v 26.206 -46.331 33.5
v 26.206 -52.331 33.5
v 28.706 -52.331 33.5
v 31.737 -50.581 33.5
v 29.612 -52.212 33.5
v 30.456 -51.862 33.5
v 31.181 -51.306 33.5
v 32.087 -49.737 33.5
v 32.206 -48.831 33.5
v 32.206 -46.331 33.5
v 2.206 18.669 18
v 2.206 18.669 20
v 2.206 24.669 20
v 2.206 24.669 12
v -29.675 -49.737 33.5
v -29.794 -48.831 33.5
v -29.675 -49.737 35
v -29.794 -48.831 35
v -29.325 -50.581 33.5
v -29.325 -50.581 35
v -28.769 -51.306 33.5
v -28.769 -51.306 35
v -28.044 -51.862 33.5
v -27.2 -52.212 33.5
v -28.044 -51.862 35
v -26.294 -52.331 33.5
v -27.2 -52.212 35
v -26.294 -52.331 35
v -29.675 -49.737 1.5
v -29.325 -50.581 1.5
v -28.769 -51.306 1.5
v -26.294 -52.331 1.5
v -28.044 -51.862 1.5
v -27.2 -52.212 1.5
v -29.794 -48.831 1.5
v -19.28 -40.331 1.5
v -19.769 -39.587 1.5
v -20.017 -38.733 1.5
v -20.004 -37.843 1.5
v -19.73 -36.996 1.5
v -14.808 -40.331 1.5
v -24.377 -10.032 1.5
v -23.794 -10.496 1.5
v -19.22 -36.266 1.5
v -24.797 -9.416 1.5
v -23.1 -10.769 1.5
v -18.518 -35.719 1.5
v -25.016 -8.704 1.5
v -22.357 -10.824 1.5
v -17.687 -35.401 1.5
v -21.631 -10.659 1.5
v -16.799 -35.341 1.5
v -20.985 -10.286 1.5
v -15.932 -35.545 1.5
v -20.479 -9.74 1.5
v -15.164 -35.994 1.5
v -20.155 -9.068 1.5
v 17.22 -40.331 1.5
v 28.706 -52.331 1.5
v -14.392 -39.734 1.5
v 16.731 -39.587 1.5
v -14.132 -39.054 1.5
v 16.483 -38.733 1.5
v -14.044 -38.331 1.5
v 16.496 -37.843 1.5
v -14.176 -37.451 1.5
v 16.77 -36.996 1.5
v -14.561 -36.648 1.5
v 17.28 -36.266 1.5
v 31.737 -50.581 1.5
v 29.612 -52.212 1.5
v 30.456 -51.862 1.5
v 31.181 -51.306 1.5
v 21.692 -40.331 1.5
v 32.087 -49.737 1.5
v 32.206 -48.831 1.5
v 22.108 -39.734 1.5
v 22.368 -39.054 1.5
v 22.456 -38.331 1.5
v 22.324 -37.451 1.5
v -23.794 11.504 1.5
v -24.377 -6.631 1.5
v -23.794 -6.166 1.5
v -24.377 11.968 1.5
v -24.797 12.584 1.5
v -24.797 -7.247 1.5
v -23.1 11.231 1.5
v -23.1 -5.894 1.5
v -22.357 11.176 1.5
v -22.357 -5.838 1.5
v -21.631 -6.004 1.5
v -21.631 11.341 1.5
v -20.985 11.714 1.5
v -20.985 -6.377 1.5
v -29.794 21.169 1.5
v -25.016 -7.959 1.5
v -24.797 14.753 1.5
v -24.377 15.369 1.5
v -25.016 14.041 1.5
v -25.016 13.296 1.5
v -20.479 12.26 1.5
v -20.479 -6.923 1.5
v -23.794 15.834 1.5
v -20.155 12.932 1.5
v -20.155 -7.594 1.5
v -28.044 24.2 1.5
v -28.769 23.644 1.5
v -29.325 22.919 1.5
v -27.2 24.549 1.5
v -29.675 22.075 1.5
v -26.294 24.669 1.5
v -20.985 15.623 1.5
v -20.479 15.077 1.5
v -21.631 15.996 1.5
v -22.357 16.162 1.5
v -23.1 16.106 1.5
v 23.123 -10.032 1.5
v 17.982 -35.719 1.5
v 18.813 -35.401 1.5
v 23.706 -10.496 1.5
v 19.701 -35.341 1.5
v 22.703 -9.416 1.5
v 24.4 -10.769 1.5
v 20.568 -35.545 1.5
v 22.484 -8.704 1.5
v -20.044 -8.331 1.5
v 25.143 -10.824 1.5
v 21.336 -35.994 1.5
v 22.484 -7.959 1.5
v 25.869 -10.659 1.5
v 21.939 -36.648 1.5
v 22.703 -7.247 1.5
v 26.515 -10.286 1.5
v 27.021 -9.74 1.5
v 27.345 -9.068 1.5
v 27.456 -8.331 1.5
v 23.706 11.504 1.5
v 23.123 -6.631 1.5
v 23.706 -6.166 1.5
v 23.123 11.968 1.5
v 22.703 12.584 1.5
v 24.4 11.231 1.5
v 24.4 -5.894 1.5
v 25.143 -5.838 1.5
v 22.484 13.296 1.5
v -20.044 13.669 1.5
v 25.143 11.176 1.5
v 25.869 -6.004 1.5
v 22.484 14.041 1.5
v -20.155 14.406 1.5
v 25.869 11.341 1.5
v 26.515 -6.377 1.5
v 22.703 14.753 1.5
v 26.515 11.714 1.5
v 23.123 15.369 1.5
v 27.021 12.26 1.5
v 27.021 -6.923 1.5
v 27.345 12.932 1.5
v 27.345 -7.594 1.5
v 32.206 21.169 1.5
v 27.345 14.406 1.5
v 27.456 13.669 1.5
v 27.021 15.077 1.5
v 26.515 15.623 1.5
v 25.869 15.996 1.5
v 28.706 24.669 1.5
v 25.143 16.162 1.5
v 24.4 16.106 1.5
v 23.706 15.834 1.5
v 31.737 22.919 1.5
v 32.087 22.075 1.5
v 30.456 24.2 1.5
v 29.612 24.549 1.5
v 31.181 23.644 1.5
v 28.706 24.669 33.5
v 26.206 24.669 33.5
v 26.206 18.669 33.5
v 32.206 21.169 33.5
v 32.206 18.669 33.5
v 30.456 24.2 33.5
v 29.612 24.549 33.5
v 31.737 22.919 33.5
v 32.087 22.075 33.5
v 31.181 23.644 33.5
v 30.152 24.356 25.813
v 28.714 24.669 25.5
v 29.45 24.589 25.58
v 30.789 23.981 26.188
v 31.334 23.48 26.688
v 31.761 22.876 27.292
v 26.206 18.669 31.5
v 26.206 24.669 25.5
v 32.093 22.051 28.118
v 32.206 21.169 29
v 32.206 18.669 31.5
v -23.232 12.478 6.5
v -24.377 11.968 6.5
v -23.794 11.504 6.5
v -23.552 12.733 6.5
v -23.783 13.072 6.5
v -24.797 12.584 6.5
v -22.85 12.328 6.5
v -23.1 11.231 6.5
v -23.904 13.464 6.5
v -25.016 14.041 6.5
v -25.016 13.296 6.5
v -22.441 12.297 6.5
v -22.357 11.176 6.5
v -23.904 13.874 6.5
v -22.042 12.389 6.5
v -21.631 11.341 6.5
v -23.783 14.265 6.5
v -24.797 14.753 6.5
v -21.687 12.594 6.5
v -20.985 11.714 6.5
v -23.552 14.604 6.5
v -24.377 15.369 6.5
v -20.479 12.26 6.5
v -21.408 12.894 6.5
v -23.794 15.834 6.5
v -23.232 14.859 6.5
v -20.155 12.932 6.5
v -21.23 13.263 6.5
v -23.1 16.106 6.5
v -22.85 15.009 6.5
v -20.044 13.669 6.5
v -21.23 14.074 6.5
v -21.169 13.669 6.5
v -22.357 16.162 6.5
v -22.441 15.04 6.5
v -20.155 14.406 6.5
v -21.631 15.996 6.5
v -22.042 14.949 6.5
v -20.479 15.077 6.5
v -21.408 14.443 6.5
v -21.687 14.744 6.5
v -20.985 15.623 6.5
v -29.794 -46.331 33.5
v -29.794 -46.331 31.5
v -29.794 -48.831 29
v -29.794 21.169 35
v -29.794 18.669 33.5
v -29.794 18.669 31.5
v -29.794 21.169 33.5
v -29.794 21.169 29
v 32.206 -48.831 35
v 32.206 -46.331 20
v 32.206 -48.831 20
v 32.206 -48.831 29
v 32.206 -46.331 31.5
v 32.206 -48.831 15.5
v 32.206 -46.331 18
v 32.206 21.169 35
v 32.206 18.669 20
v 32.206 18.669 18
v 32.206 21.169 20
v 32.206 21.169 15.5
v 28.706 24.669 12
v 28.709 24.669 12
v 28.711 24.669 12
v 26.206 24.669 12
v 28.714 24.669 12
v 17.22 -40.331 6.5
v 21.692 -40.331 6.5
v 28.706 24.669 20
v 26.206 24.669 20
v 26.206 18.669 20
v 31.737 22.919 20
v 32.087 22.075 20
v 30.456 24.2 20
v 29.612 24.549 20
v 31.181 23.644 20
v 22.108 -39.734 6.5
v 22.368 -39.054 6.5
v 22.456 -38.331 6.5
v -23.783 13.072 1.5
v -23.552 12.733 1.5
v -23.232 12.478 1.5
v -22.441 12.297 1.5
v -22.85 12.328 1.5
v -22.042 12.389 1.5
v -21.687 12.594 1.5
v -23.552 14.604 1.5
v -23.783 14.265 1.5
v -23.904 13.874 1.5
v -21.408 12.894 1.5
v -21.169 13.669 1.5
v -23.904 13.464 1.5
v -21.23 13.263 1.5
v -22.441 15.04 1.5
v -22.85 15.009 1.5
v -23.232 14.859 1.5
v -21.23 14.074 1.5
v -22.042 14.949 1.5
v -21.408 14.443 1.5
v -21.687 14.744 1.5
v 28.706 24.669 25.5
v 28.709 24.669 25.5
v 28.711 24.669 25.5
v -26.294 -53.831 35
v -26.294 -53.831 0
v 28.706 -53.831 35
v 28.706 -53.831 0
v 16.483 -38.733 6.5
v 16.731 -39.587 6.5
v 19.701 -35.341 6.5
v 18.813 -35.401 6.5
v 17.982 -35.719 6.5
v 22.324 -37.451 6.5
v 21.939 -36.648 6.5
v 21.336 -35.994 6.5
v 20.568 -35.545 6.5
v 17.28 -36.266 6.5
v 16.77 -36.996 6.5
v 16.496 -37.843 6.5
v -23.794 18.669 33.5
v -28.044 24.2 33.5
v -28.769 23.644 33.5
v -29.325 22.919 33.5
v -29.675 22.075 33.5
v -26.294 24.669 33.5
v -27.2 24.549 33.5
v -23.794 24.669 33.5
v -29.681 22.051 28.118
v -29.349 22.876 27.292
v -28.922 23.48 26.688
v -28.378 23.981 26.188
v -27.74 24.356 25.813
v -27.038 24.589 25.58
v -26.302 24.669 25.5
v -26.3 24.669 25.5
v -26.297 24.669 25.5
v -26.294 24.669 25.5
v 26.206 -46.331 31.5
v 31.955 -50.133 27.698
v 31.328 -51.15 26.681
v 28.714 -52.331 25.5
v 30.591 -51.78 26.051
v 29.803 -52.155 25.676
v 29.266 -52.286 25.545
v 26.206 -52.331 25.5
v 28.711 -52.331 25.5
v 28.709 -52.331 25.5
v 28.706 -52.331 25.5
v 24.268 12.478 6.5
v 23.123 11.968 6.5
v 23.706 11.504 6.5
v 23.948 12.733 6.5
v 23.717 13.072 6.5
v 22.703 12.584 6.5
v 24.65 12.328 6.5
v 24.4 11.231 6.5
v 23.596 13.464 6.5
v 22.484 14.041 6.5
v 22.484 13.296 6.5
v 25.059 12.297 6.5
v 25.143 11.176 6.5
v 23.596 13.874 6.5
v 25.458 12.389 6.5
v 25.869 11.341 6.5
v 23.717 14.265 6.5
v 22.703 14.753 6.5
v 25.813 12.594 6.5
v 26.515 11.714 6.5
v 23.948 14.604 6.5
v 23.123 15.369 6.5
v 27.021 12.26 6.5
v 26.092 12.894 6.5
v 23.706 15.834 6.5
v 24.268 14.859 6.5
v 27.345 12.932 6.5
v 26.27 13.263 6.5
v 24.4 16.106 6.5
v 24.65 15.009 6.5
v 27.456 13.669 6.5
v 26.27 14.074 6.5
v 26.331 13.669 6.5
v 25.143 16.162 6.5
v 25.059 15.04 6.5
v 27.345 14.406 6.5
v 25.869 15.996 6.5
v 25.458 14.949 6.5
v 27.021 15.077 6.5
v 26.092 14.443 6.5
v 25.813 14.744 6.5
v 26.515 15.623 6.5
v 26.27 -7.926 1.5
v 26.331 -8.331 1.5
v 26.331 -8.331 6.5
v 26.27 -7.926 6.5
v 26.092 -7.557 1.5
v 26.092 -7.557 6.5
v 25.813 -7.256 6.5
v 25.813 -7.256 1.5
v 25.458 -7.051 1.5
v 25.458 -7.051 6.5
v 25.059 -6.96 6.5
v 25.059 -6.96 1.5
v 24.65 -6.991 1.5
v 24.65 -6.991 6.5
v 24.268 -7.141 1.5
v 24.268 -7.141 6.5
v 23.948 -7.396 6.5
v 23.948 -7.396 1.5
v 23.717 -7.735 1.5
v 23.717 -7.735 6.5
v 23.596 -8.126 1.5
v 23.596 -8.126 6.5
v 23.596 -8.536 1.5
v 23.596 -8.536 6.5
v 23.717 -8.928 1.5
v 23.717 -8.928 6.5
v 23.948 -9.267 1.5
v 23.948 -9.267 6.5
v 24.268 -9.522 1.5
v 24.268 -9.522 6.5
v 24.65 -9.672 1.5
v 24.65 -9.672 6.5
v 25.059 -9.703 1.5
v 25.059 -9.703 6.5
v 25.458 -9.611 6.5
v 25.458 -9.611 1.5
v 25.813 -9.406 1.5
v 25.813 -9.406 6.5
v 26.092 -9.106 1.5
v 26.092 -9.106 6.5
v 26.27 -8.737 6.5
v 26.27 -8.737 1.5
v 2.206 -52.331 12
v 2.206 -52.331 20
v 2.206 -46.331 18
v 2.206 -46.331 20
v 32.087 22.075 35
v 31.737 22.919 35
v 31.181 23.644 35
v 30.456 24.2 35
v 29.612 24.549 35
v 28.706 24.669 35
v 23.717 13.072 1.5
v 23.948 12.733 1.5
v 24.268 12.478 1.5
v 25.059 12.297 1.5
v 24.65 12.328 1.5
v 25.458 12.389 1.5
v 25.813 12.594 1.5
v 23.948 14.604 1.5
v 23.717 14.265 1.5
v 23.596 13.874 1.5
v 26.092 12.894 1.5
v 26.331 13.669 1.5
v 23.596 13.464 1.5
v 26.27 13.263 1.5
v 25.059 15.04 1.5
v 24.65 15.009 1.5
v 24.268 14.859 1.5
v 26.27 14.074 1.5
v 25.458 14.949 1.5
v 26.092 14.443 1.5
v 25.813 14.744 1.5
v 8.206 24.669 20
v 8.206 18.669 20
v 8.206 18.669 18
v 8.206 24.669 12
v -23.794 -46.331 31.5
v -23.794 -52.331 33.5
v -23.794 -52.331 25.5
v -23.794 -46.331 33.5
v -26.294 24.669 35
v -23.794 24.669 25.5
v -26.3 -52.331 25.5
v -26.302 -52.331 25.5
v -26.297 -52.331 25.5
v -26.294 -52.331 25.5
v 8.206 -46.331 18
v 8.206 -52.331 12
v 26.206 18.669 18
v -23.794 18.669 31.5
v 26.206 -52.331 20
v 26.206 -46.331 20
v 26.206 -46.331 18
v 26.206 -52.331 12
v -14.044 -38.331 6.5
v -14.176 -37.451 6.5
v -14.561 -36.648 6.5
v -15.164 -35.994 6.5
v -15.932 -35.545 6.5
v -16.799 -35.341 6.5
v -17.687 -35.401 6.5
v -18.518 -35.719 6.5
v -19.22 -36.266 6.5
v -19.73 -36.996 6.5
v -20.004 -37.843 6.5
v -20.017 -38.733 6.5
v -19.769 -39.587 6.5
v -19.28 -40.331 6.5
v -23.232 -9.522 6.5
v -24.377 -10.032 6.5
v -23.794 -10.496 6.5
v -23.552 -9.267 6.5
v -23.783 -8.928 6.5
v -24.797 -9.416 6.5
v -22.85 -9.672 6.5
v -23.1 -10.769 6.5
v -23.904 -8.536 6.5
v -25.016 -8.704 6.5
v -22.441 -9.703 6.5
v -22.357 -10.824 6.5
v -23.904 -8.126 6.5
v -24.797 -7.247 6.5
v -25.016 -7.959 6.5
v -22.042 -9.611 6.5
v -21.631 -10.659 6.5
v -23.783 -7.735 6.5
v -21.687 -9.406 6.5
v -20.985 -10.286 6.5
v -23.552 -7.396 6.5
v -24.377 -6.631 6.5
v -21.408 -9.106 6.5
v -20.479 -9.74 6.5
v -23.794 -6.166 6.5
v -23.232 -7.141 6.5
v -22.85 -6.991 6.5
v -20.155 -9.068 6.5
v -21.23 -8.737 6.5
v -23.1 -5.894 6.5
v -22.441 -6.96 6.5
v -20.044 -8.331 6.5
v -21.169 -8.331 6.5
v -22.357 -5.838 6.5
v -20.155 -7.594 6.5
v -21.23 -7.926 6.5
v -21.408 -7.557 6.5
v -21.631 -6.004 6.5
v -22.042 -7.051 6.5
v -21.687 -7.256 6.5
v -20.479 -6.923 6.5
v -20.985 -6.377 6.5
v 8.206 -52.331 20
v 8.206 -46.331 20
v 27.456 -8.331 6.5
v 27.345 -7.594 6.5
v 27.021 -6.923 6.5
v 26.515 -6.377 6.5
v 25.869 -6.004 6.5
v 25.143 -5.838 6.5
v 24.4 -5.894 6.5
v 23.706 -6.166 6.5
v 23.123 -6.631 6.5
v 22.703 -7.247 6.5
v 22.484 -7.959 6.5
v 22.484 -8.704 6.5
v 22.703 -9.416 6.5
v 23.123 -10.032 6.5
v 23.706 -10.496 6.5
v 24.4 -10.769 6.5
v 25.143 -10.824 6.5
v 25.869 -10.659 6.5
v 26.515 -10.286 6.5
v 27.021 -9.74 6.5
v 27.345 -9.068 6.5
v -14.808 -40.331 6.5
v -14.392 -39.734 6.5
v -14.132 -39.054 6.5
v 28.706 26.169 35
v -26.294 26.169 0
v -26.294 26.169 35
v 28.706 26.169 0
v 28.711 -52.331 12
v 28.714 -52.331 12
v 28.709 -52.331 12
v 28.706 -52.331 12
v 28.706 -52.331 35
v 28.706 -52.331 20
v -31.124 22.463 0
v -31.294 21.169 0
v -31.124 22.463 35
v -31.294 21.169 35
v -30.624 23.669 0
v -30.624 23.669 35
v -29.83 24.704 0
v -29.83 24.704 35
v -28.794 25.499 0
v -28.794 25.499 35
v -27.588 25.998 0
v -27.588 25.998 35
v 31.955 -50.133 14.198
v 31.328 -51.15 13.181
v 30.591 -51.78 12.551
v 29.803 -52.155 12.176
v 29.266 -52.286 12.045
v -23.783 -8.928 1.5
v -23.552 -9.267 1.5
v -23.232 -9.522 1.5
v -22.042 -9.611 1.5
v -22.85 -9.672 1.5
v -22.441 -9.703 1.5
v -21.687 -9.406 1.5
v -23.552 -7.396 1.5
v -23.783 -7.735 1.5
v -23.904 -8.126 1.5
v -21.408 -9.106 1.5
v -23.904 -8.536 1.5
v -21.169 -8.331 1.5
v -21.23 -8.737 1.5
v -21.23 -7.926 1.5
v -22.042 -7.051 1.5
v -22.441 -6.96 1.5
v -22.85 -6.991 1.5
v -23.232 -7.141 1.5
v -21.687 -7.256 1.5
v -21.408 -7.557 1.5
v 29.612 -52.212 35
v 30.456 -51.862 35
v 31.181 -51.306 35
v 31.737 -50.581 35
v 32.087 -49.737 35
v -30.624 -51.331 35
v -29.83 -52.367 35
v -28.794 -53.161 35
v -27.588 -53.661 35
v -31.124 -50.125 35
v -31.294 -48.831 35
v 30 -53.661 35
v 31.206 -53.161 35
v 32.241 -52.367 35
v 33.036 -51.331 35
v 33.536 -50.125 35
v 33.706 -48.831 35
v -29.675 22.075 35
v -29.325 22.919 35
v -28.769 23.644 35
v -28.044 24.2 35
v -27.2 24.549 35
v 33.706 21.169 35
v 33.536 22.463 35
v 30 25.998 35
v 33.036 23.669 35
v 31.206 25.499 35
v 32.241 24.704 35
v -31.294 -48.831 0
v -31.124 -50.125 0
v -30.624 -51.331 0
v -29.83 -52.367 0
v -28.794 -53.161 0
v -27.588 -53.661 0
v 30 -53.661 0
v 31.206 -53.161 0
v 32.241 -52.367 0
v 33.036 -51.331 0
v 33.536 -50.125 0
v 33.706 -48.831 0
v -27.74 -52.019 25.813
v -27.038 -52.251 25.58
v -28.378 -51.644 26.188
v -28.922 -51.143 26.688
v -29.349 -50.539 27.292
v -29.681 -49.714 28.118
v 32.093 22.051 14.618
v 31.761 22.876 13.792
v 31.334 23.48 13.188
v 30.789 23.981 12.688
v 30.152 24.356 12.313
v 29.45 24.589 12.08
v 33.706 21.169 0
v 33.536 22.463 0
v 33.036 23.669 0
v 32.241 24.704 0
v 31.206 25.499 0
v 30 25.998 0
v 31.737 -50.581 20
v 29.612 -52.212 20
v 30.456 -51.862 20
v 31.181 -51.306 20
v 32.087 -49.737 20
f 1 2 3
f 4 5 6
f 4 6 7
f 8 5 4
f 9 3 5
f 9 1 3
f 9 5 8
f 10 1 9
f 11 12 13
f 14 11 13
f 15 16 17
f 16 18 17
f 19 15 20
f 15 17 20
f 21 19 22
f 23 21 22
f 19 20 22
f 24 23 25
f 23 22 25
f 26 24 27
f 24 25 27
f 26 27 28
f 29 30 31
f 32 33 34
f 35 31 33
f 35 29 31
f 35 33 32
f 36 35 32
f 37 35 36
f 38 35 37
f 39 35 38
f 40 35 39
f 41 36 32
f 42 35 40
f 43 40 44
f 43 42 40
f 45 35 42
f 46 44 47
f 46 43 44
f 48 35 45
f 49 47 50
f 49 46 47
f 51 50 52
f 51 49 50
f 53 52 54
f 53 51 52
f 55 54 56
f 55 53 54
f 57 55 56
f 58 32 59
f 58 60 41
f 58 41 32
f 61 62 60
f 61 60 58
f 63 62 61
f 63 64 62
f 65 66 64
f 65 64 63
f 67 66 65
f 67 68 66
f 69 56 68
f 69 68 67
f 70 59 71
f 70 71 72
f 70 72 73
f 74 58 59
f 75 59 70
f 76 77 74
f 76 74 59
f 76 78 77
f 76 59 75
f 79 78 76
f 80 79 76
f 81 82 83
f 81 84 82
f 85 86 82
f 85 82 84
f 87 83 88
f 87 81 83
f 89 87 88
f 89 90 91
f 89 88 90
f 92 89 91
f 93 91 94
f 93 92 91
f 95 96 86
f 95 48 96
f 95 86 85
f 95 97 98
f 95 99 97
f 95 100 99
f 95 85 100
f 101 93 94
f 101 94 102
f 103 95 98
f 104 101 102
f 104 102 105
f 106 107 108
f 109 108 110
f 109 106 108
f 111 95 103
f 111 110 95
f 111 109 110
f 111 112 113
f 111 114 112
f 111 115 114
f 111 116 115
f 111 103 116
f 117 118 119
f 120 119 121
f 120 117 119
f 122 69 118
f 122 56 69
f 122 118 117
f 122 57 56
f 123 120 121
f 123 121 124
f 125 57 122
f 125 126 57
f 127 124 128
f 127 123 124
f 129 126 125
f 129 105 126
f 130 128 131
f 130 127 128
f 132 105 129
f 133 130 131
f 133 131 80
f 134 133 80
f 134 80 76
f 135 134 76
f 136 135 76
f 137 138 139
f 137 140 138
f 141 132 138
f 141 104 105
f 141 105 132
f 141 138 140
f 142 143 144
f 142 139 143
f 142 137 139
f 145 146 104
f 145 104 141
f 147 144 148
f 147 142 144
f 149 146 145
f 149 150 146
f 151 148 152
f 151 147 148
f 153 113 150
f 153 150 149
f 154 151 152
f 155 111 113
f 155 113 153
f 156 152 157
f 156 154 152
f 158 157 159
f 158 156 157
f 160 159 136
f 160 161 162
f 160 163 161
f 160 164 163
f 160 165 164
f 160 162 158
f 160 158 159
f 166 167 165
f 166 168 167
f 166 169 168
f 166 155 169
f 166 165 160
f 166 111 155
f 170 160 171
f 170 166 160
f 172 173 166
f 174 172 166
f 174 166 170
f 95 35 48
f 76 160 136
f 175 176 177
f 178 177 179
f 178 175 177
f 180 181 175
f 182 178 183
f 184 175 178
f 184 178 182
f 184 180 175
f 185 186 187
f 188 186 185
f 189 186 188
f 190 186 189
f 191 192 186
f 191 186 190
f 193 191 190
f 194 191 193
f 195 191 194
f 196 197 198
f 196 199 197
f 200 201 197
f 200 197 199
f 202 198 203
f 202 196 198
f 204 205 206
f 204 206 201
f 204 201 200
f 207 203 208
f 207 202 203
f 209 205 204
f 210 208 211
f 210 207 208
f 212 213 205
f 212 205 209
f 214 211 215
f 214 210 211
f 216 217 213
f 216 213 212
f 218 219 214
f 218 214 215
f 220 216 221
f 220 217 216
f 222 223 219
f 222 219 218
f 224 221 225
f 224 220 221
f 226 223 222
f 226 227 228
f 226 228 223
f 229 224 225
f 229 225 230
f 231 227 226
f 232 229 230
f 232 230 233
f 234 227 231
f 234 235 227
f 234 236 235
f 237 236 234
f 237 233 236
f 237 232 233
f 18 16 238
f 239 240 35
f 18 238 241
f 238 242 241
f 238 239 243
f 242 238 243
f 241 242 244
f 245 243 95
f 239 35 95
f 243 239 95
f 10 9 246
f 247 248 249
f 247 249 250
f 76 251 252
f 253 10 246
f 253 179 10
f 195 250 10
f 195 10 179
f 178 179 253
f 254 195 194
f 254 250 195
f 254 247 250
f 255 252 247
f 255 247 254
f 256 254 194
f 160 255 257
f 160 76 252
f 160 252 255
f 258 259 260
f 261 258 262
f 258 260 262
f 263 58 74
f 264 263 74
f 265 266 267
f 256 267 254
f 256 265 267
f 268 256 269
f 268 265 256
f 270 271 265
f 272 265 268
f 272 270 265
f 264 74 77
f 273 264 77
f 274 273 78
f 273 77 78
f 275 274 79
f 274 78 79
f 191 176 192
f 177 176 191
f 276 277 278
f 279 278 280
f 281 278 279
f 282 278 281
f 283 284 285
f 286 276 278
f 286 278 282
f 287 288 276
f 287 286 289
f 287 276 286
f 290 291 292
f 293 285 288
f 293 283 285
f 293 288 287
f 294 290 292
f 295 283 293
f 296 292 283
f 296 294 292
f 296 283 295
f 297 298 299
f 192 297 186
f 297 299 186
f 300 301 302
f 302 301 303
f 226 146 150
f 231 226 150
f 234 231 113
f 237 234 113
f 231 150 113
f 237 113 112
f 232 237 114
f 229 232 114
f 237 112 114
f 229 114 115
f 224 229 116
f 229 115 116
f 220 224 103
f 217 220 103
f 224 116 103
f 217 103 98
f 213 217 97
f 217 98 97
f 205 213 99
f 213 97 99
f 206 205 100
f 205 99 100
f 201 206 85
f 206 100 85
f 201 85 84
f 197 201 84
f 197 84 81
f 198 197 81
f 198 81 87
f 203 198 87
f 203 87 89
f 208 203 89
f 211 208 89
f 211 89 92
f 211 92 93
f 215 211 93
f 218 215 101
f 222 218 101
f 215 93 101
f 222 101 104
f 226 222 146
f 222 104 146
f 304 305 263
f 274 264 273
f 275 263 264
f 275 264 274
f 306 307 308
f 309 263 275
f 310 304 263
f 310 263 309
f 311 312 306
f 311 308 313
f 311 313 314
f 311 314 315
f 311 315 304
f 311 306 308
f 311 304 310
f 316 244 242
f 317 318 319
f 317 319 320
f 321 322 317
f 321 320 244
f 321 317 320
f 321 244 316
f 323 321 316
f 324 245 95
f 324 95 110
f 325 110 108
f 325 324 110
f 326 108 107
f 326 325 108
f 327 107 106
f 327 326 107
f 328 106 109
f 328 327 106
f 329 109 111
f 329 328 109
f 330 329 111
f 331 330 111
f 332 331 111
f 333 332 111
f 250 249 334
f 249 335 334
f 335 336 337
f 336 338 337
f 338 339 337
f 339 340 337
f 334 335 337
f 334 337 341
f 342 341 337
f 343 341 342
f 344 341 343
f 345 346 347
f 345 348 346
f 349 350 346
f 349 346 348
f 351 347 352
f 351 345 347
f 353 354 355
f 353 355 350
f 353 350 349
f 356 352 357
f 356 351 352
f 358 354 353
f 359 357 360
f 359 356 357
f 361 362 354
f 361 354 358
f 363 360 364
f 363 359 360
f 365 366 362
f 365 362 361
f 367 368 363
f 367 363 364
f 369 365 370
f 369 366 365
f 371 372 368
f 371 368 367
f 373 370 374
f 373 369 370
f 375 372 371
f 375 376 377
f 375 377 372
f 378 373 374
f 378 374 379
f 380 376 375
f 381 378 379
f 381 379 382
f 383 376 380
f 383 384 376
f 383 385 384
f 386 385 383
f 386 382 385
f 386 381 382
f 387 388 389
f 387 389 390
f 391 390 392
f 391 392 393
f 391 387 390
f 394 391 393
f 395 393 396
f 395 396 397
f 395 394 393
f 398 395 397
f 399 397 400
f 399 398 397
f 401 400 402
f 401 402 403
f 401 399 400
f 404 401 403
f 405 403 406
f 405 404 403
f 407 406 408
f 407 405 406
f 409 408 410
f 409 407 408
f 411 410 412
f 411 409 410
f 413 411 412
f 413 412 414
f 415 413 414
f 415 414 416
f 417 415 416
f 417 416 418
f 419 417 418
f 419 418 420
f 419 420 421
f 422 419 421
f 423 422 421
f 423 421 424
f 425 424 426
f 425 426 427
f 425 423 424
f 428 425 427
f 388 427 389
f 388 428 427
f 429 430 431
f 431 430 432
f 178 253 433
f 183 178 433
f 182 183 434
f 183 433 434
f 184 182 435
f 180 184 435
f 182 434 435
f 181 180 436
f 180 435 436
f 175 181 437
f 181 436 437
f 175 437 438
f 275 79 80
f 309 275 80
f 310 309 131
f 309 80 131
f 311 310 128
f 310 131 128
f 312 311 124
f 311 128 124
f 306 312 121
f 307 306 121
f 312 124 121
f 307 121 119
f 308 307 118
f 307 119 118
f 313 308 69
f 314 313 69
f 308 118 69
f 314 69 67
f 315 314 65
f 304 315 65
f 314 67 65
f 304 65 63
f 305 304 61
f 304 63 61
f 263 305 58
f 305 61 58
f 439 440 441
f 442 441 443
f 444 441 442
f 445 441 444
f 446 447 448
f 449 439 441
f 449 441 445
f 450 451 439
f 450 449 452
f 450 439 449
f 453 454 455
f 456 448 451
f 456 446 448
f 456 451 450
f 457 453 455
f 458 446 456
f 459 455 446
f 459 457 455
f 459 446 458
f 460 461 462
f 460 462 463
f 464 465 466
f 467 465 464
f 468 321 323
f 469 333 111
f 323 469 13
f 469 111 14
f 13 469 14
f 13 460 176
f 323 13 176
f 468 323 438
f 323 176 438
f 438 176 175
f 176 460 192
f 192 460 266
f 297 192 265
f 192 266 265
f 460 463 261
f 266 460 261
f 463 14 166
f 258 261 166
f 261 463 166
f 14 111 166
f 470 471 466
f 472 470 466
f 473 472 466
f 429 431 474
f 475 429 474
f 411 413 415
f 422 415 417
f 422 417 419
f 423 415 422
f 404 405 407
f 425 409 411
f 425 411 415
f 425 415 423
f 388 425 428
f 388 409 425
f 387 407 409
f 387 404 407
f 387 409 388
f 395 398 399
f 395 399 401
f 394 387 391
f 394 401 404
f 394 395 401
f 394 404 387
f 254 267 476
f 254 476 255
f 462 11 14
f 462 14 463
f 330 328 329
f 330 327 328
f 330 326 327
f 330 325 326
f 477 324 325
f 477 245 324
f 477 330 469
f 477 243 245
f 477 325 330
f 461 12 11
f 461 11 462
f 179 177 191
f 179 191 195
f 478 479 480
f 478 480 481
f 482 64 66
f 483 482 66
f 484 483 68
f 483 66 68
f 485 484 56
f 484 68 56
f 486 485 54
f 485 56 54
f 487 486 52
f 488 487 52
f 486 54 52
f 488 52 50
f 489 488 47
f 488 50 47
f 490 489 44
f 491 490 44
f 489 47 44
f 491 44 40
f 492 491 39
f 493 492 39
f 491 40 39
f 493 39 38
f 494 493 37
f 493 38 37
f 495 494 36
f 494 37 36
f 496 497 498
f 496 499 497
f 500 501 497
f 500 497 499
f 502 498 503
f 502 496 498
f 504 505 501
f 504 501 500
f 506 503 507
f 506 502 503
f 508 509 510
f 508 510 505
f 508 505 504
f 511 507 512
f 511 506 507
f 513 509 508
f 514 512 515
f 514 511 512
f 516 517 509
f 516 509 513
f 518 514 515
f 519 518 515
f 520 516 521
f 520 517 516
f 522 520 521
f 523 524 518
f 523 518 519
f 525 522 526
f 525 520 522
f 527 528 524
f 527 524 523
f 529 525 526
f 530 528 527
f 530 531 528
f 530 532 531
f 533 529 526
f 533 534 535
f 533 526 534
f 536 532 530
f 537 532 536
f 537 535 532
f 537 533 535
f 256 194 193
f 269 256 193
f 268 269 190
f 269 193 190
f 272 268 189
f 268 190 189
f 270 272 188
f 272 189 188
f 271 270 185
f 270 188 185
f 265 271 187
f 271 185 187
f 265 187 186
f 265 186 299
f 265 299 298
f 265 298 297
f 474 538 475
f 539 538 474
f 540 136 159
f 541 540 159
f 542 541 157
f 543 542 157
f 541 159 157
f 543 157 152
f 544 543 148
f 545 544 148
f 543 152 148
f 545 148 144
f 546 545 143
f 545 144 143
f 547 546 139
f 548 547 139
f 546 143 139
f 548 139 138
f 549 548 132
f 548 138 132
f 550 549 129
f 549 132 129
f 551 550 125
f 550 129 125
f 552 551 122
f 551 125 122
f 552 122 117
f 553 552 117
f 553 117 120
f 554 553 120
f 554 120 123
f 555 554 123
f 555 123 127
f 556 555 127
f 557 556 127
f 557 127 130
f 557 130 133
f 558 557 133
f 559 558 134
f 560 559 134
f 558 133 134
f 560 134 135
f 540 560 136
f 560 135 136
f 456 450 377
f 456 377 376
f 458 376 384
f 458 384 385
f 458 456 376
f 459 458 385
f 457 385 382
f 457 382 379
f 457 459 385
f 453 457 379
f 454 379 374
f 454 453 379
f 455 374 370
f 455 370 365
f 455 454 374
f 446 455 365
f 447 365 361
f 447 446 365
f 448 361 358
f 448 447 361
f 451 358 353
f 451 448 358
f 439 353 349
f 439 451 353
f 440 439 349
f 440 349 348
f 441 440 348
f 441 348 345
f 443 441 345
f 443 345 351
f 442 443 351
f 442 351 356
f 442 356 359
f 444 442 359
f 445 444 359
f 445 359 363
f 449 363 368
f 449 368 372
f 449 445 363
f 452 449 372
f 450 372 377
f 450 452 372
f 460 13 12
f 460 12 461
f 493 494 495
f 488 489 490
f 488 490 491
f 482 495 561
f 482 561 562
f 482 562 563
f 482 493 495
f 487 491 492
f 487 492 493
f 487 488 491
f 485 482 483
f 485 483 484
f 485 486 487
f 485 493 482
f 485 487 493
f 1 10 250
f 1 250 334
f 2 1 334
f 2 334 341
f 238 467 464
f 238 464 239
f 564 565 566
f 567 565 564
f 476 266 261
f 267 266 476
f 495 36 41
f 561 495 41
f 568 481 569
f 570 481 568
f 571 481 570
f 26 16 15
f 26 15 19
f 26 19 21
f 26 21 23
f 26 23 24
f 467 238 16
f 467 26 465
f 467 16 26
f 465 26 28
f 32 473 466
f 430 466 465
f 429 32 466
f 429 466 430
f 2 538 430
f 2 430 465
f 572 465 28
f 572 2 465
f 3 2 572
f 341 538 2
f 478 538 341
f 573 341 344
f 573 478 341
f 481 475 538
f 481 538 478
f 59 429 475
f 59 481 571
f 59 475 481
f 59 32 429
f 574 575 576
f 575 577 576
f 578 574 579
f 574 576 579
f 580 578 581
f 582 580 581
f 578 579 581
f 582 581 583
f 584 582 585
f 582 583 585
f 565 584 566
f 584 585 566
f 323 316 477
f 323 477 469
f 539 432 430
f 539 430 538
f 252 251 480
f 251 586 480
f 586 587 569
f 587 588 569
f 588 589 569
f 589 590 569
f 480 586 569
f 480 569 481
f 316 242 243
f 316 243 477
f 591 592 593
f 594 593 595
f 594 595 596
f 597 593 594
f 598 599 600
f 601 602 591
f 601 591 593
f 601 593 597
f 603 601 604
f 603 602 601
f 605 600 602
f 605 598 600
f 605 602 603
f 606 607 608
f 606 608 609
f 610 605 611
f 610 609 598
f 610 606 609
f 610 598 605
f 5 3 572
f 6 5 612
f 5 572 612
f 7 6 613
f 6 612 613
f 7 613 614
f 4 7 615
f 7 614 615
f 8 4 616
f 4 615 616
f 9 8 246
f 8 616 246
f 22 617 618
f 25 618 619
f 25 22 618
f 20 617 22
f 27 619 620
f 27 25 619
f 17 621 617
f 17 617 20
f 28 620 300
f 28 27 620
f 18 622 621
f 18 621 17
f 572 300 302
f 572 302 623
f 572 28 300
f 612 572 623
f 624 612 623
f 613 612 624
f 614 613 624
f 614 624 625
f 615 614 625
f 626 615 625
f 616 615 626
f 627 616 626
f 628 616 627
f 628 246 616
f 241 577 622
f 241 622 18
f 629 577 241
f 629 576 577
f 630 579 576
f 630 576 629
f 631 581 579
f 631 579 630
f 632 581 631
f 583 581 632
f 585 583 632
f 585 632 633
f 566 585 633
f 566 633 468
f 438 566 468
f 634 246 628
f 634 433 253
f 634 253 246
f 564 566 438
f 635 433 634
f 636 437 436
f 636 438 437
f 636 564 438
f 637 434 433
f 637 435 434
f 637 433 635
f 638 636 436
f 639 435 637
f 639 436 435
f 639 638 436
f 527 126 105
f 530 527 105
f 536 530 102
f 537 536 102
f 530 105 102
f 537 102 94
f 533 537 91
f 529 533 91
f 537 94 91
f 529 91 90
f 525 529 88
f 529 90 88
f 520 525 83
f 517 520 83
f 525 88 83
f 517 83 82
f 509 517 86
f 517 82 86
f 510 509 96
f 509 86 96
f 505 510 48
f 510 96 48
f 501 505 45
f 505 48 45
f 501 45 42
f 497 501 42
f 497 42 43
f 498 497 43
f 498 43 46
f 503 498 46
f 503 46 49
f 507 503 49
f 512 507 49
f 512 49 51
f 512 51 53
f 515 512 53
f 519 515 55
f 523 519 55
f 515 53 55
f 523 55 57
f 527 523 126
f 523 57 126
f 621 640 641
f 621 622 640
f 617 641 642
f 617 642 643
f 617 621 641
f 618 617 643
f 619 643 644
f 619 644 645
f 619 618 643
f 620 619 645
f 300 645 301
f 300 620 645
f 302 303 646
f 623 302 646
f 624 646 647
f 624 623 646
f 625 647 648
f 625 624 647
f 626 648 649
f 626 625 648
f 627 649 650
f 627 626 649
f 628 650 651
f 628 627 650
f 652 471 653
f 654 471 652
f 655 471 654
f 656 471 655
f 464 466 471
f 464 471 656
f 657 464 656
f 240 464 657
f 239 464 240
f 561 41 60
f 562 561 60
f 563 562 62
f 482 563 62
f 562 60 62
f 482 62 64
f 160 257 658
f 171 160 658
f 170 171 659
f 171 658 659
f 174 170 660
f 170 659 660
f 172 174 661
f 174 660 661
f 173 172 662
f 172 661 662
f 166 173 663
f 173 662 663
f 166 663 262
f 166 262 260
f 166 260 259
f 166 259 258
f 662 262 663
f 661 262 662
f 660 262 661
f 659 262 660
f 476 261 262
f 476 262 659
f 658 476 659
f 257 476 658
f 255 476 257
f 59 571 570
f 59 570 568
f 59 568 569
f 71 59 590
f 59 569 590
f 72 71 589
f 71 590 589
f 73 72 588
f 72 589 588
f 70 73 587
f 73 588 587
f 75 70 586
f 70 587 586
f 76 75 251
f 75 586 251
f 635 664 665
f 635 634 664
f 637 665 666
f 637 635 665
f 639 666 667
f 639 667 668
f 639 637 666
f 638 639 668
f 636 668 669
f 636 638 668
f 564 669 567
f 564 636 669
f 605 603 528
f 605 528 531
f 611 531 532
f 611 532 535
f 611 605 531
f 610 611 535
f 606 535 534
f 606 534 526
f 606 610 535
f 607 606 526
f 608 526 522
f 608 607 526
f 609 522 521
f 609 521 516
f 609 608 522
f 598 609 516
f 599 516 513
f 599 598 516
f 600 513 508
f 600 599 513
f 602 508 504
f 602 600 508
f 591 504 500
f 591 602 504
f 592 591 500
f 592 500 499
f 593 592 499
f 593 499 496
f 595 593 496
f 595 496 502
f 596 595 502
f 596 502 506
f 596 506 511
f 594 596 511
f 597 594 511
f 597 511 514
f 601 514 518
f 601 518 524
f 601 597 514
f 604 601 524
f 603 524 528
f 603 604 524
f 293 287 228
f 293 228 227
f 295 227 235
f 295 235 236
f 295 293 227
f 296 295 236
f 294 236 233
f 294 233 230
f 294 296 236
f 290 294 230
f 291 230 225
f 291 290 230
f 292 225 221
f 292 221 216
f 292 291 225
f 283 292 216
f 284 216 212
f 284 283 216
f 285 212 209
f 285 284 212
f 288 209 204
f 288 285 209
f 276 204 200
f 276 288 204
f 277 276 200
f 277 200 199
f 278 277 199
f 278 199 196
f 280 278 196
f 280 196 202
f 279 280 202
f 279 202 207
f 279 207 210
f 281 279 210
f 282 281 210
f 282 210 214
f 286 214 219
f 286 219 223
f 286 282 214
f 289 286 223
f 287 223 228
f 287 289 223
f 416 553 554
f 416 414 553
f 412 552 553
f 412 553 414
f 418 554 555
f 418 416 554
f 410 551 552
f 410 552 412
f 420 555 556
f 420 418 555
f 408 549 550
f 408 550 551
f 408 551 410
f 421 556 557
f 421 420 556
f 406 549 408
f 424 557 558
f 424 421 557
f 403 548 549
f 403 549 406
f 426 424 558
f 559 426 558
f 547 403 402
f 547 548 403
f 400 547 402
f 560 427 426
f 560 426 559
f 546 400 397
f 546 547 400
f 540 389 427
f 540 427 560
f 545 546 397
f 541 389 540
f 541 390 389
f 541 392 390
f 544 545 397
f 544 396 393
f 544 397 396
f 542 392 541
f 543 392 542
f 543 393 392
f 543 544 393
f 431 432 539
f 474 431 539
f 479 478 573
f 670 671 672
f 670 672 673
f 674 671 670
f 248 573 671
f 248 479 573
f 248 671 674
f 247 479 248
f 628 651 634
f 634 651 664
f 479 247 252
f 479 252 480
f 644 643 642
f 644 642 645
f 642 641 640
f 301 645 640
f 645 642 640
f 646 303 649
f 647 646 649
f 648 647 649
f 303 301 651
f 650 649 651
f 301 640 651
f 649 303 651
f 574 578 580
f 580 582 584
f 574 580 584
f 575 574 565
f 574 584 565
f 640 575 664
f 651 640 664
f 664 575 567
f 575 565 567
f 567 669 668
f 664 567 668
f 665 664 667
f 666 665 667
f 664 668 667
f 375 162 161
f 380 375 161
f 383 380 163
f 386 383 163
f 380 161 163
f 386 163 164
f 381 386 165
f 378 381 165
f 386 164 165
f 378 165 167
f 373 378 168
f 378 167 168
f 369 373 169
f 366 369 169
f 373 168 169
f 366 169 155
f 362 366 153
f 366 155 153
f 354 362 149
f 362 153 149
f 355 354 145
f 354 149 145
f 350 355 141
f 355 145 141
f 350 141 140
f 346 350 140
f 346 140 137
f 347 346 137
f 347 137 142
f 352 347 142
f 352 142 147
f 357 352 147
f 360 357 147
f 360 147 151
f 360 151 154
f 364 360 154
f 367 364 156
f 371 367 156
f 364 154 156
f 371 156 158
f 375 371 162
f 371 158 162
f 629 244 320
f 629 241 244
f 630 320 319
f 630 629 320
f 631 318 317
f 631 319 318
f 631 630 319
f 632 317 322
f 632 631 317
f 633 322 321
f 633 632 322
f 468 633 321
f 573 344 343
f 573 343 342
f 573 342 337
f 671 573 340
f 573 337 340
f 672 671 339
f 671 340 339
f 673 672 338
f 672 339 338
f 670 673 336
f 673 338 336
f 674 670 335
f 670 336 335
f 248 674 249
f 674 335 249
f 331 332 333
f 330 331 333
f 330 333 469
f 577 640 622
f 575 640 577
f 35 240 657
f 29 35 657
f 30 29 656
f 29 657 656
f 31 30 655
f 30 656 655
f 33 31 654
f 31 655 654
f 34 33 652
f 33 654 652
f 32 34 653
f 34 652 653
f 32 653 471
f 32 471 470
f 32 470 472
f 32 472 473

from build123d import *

# Parameters (mm, degrees)
F0_W      = 65
F0_H      = 80
F1_DEPTH  = 35
F2_R      = 5
F3_T      = -1.5
F6_DEPTH  = 8
F7_R      = 2.5
F7_R_2    = 1.375
F9_DEPTH  = 5
F10_W     = 6
F10_H     = 7.5
F11_DEPTH = 8
F12_SIZE  = 5.99999


# Not quite as in the source:
# - a fillet or chamfer is up to 0.001 mm smaller than in the source, because OpenCascade refuses the exact size


with BuildPart() as f1:
    # F0 (on Top) → F1 (new body)
    with BuildSketch(Plane.XY):
        with Locations((1.2058935761, -13.8313528726)):
            Rectangle(F0_W, F0_H)
    extrude(amount=F1_DEPTH)

    # F2
    f2_edges = [f1.edges().sort_by_distance(p)[0] for p in [
        (-31.294106, -53.831353, 17.5),
        (-31.294106, 26.168647, 17.5),
        (33.705894, -53.831353, 17.5),
        (33.705894, 26.168647, 17.5),
    ]]
    fillet(f2_edges, radius=F2_R)

    # F3
    f3_openings = [f1.faces().sort_by_distance(p)[0] for p in [
        (1.205894, -13.831353, 35),
    ]]
    offset(amount=F3_T, openings=f3_openings)

    # F5 (on offset) → F6 (join)
    with BuildSketch(Plane.XY.offset(33.5)):
        with BuildLine():
            Line((-29.7941064239, 18.6686471274), (-23.7941064239, 18.6686471274))
            Line((-23.7941064239, 18.6686471274), (-23.7941064239, 24.6686471274))
            Line((-23.7941064239, 24.6686471274), (-26.2941064239, 24.6686471274))
            ThreePointArc((-26.2941064239, 24.6686471274), (-28.768980158, 23.6435208615), (-29.7941064239, 21.1686471274))
            Line((-29.7941064239, 21.1686471274), (-29.7941064239, 18.6686471274))
        make_face()
        with BuildLine():
            Line((28.7058935761, 24.6686471274), (26.2058935761, 24.6686471274))
            Line((26.2058935761, 24.6686471274), (26.2058935761, 18.6686471274))
            Line((26.2058935761, 18.6686471274), (32.2058935761, 18.6686471274))
            Line((32.2058935761, 18.6686471274), (32.2058935761, 21.1686471274))
            ThreePointArc((32.2058935761, 21.1686471274), (31.1807673103, 23.6435208615), (28.7058935761, 24.6686471274))
        make_face()
        with BuildLine():
            Line((26.2058935761, -46.3313528726), (26.2058935761, -52.3313528726))
            Line((26.2058935761, -52.3313528726), (28.7058935761, -52.3313528726))
            ThreePointArc((28.7058935761, -52.3313528726), (31.1807673103, -51.3062266068), (32.2058935761, -48.8313528726))
            Line((32.2058935761, -48.8313528726), (32.2058935761, -46.3313528726))
            Line((32.2058935761, -46.3313528726), (26.2058935761, -46.3313528726))
        make_face()
        with BuildLine():
            Line((-23.7941064239, -46.3313528726), (-29.7941064239, -46.3313528726))
            Line((-29.7941064239, -46.3313528726), (-29.7941064239, -48.8313528726))
            ThreePointArc((-29.7941064239, -48.8313528726), (-28.768980158, -51.3062266068), (-26.2941064239, -52.3313528726))
            Line((-26.2941064239, -52.3313528726), (-23.7941064239, -52.3313528726))
            Line((-23.7941064239, -52.3313528726), (-23.7941064239, -46.3313528726))
        make_face()
    extrude(amount=-F6_DEPTH)

    # F7 (on face) → F9 (join)
    with BuildSketch(Plane.XY.offset(1.5)):
        with Locations((-22.5441064239, 13.6686471274)):
            Circle(F7_R)
        with Locations((-22.5441064239, 13.6686471274)):
            Circle(F7_R_2, mode=Mode.SUBTRACT)
        with Locations((-22.5441064239, -8.3313528726)):
            Circle(F7_R)
        with Locations((-22.5441064239, -8.3313528726)):
            Circle(F7_R_2, mode=Mode.SUBTRACT)
        with Locations((24.9558935761, 13.6686471274)):
            Circle(F7_R)
        with Locations((24.9558935761, 13.6686471274)):
            Circle(F7_R_2, mode=Mode.SUBTRACT)
        with Locations((24.9558935761, -8.3313528726)):
            Circle(F7_R)
        with Locations((24.9558935761, -8.3313528726)):
            Circle(F7_R_2, mode=Mode.SUBTRACT)
        with BuildLine():
            Line((17.2198255986, -40.3313528726), (21.6919615536, -40.3313528726))
            ThreePointArc((21.6919615536, -40.3313528726), (22.258410653, -39.4018191419), (22.4558935761, -38.3313528726))
            ThreePointArc((22.4558935761, -38.3313528726), (18.3854273068, -35.5288357957), (17.2198255986, -40.3313528726))
        make_face()
        with BuildLine():
            ThreePointArc((-14.0441064239, -38.3313528726), (-18.1145726932, -35.5288357957), (-19.2801744014, -40.3313528726))
            Line((-19.2801744014, -40.3313528726), (-14.8080384464, -40.3313528726))
            ThreePointArc((-14.8080384464, -40.3313528726), (-14.241589347, -39.4018191419), (-14.0441064239, -38.3313528726))
        make_face()
    extrude(amount=F9_DEPTH)

    # F10 (on offset) → F11 (join)
    with BuildSketch(Plane.XY.offset(20)):
        with Locations((5.2058935761, 22.4186471274)):
            Rectangle(F10_W, F10_H)
        with BuildLine():
            Line((26.2058935761, 18.6686471274), (32.2058935761, 18.6686471274))
            Line((32.2058935761, 18.6686471274), (32.2058935761, 21.1686471274))
            ThreePointArc((32.2058935761, 21.1686471274), (31.1807673103, 23.6435208615), (28.7058935761, 24.6686471274))
            Line((28.7058935761, 24.6686471274), (26.2058935761, 24.6686471274))
            Line((26.2058935761, 24.6686471274), (26.2058935761, 18.6686471274))
        make_face()
        with BuildLine():
            Line((32.2058935761, -46.3313528726), (26.2058935761, -46.3313528726))
            Line((26.2058935761, -46.3313528726), (26.2058935761, -52.3313528726))
            Line((26.2058935761, -52.3313528726), (28.7058935761, -52.3313528726))
            ThreePointArc((28.7058935761, -52.3313528726), (31.1807673103, -51.3062266068), (32.2058935761, -48.8313528726))
            Line((32.2058935761, -48.8313528726), (32.2058935761, -46.3313528726))
        make_face()
        with Locations((5.2058935761, -50.0813528726)):
            Rectangle(F10_W, F10_H)
    extrude(amount=-F11_DEPTH)

    # F12 (size 6 in the source; OpenCascade refuses exactly that, so slightly less here)
    f12_edges = [f1.edges().sort_by_distance(p)[0] for p in [
        (29.205894, -46.331353, 25.5),
        (29.205894, -46.331353, 12),
        (5.205894, -46.331353, 12),
        (29.205894, 18.668647, 12),
        (29.205894, 18.668647, 25.5),
        (5.205894, 18.668647, 12),
        (-26.794106, 18.668647, 25.5),
        (-26.794106, -46.331353, 25.5),
    ]]
    chamfer(f12_edges, length=F12_SIZE)


solid = f1.part
